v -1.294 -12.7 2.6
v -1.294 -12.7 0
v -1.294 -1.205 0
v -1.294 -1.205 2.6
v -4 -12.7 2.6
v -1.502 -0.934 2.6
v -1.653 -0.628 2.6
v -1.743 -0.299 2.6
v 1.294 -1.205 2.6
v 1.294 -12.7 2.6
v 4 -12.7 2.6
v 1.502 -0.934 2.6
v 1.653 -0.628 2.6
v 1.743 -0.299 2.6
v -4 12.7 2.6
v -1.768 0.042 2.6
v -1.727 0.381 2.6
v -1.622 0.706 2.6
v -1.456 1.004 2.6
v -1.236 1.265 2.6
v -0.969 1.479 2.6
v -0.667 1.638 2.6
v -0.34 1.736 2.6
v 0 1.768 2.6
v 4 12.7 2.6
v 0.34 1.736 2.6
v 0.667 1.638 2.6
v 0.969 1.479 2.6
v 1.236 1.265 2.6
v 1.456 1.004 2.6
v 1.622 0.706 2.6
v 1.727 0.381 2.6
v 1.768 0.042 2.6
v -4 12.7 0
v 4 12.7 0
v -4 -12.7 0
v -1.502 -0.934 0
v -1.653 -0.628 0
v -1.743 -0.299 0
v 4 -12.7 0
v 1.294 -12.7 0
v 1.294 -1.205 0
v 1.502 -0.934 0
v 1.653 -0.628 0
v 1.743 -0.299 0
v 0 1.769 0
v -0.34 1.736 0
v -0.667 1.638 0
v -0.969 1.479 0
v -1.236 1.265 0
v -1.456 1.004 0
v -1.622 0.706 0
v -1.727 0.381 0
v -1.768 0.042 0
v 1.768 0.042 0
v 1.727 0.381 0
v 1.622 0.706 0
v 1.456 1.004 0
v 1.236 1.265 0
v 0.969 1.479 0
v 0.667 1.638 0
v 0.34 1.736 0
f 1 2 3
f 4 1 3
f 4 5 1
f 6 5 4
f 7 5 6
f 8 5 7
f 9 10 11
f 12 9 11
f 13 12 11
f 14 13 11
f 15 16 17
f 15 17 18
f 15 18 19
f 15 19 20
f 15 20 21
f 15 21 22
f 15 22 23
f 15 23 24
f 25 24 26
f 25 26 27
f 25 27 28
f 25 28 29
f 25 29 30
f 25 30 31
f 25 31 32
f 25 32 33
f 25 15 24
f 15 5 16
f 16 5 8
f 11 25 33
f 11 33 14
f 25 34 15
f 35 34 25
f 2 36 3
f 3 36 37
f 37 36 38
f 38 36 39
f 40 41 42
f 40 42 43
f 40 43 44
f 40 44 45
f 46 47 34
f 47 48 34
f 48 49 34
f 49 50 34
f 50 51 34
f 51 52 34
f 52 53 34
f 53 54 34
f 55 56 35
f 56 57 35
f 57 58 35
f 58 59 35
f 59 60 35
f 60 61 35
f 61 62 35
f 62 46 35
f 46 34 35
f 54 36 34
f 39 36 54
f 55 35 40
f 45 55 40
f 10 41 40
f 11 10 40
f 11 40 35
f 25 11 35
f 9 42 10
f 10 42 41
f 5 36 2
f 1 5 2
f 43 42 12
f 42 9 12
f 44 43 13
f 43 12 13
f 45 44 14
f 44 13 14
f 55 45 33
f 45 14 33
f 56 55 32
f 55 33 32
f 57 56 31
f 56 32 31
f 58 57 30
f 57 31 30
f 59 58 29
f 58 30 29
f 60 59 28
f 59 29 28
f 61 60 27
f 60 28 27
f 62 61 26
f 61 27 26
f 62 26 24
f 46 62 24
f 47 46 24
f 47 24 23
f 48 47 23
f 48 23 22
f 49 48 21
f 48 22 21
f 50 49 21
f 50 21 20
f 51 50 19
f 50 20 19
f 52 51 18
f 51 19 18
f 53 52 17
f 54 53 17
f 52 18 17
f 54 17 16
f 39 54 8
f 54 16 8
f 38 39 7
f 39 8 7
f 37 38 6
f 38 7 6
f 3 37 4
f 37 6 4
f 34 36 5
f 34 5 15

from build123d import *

# Parameters (mm, degrees)
SKETCH032_W     = 8
SKETCH032_H     = 25.4
PAD005_DEPTH    = 2.6
POCKET031_DEPTH = 2.601
SKETCH035_R     = 1.7685
POCKET032_DEPTH = 2.901


with BuildPart() as part:
    # Sketch032 → Pad005 (new body)
    with BuildSketch(Plane.XY):
        Rectangle(SKETCH032_W, SKETCH032_H)
    extrude(amount=PAD005_DEPTH)

    # Sketch033 (on Face5 of Pad005) → Pocket031 (cut, through all)
    with BuildSketch(Plane(origin=(0, 0, 0), x_dir=(1, 0, 0), z_dir=(0, 0, -1))):
        with BuildLine():
            ThreePointArc((-1.294, 0), (0, -1.294), (1.294, 0))
            Line((1.294, 0), (1.294, 12.7))
            Line((1.294, 12.7), (-1.294, 12.7))
            Line((-1.294, 12.7), (-1.294, 0))
        make_face()
    extrude(amount=-POCKET031_DEPTH, mode=Mode.SUBTRACT)

    # Sketch035 → Pocket032 (cut, through all)
    with BuildSketch(Plane.XY.offset(2.9)):
        Circle(SKETCH035_R)
    extrude(amount=-POCKET032_DEPTH, mode=Mode.SUBTRACT)


solid = part.part
